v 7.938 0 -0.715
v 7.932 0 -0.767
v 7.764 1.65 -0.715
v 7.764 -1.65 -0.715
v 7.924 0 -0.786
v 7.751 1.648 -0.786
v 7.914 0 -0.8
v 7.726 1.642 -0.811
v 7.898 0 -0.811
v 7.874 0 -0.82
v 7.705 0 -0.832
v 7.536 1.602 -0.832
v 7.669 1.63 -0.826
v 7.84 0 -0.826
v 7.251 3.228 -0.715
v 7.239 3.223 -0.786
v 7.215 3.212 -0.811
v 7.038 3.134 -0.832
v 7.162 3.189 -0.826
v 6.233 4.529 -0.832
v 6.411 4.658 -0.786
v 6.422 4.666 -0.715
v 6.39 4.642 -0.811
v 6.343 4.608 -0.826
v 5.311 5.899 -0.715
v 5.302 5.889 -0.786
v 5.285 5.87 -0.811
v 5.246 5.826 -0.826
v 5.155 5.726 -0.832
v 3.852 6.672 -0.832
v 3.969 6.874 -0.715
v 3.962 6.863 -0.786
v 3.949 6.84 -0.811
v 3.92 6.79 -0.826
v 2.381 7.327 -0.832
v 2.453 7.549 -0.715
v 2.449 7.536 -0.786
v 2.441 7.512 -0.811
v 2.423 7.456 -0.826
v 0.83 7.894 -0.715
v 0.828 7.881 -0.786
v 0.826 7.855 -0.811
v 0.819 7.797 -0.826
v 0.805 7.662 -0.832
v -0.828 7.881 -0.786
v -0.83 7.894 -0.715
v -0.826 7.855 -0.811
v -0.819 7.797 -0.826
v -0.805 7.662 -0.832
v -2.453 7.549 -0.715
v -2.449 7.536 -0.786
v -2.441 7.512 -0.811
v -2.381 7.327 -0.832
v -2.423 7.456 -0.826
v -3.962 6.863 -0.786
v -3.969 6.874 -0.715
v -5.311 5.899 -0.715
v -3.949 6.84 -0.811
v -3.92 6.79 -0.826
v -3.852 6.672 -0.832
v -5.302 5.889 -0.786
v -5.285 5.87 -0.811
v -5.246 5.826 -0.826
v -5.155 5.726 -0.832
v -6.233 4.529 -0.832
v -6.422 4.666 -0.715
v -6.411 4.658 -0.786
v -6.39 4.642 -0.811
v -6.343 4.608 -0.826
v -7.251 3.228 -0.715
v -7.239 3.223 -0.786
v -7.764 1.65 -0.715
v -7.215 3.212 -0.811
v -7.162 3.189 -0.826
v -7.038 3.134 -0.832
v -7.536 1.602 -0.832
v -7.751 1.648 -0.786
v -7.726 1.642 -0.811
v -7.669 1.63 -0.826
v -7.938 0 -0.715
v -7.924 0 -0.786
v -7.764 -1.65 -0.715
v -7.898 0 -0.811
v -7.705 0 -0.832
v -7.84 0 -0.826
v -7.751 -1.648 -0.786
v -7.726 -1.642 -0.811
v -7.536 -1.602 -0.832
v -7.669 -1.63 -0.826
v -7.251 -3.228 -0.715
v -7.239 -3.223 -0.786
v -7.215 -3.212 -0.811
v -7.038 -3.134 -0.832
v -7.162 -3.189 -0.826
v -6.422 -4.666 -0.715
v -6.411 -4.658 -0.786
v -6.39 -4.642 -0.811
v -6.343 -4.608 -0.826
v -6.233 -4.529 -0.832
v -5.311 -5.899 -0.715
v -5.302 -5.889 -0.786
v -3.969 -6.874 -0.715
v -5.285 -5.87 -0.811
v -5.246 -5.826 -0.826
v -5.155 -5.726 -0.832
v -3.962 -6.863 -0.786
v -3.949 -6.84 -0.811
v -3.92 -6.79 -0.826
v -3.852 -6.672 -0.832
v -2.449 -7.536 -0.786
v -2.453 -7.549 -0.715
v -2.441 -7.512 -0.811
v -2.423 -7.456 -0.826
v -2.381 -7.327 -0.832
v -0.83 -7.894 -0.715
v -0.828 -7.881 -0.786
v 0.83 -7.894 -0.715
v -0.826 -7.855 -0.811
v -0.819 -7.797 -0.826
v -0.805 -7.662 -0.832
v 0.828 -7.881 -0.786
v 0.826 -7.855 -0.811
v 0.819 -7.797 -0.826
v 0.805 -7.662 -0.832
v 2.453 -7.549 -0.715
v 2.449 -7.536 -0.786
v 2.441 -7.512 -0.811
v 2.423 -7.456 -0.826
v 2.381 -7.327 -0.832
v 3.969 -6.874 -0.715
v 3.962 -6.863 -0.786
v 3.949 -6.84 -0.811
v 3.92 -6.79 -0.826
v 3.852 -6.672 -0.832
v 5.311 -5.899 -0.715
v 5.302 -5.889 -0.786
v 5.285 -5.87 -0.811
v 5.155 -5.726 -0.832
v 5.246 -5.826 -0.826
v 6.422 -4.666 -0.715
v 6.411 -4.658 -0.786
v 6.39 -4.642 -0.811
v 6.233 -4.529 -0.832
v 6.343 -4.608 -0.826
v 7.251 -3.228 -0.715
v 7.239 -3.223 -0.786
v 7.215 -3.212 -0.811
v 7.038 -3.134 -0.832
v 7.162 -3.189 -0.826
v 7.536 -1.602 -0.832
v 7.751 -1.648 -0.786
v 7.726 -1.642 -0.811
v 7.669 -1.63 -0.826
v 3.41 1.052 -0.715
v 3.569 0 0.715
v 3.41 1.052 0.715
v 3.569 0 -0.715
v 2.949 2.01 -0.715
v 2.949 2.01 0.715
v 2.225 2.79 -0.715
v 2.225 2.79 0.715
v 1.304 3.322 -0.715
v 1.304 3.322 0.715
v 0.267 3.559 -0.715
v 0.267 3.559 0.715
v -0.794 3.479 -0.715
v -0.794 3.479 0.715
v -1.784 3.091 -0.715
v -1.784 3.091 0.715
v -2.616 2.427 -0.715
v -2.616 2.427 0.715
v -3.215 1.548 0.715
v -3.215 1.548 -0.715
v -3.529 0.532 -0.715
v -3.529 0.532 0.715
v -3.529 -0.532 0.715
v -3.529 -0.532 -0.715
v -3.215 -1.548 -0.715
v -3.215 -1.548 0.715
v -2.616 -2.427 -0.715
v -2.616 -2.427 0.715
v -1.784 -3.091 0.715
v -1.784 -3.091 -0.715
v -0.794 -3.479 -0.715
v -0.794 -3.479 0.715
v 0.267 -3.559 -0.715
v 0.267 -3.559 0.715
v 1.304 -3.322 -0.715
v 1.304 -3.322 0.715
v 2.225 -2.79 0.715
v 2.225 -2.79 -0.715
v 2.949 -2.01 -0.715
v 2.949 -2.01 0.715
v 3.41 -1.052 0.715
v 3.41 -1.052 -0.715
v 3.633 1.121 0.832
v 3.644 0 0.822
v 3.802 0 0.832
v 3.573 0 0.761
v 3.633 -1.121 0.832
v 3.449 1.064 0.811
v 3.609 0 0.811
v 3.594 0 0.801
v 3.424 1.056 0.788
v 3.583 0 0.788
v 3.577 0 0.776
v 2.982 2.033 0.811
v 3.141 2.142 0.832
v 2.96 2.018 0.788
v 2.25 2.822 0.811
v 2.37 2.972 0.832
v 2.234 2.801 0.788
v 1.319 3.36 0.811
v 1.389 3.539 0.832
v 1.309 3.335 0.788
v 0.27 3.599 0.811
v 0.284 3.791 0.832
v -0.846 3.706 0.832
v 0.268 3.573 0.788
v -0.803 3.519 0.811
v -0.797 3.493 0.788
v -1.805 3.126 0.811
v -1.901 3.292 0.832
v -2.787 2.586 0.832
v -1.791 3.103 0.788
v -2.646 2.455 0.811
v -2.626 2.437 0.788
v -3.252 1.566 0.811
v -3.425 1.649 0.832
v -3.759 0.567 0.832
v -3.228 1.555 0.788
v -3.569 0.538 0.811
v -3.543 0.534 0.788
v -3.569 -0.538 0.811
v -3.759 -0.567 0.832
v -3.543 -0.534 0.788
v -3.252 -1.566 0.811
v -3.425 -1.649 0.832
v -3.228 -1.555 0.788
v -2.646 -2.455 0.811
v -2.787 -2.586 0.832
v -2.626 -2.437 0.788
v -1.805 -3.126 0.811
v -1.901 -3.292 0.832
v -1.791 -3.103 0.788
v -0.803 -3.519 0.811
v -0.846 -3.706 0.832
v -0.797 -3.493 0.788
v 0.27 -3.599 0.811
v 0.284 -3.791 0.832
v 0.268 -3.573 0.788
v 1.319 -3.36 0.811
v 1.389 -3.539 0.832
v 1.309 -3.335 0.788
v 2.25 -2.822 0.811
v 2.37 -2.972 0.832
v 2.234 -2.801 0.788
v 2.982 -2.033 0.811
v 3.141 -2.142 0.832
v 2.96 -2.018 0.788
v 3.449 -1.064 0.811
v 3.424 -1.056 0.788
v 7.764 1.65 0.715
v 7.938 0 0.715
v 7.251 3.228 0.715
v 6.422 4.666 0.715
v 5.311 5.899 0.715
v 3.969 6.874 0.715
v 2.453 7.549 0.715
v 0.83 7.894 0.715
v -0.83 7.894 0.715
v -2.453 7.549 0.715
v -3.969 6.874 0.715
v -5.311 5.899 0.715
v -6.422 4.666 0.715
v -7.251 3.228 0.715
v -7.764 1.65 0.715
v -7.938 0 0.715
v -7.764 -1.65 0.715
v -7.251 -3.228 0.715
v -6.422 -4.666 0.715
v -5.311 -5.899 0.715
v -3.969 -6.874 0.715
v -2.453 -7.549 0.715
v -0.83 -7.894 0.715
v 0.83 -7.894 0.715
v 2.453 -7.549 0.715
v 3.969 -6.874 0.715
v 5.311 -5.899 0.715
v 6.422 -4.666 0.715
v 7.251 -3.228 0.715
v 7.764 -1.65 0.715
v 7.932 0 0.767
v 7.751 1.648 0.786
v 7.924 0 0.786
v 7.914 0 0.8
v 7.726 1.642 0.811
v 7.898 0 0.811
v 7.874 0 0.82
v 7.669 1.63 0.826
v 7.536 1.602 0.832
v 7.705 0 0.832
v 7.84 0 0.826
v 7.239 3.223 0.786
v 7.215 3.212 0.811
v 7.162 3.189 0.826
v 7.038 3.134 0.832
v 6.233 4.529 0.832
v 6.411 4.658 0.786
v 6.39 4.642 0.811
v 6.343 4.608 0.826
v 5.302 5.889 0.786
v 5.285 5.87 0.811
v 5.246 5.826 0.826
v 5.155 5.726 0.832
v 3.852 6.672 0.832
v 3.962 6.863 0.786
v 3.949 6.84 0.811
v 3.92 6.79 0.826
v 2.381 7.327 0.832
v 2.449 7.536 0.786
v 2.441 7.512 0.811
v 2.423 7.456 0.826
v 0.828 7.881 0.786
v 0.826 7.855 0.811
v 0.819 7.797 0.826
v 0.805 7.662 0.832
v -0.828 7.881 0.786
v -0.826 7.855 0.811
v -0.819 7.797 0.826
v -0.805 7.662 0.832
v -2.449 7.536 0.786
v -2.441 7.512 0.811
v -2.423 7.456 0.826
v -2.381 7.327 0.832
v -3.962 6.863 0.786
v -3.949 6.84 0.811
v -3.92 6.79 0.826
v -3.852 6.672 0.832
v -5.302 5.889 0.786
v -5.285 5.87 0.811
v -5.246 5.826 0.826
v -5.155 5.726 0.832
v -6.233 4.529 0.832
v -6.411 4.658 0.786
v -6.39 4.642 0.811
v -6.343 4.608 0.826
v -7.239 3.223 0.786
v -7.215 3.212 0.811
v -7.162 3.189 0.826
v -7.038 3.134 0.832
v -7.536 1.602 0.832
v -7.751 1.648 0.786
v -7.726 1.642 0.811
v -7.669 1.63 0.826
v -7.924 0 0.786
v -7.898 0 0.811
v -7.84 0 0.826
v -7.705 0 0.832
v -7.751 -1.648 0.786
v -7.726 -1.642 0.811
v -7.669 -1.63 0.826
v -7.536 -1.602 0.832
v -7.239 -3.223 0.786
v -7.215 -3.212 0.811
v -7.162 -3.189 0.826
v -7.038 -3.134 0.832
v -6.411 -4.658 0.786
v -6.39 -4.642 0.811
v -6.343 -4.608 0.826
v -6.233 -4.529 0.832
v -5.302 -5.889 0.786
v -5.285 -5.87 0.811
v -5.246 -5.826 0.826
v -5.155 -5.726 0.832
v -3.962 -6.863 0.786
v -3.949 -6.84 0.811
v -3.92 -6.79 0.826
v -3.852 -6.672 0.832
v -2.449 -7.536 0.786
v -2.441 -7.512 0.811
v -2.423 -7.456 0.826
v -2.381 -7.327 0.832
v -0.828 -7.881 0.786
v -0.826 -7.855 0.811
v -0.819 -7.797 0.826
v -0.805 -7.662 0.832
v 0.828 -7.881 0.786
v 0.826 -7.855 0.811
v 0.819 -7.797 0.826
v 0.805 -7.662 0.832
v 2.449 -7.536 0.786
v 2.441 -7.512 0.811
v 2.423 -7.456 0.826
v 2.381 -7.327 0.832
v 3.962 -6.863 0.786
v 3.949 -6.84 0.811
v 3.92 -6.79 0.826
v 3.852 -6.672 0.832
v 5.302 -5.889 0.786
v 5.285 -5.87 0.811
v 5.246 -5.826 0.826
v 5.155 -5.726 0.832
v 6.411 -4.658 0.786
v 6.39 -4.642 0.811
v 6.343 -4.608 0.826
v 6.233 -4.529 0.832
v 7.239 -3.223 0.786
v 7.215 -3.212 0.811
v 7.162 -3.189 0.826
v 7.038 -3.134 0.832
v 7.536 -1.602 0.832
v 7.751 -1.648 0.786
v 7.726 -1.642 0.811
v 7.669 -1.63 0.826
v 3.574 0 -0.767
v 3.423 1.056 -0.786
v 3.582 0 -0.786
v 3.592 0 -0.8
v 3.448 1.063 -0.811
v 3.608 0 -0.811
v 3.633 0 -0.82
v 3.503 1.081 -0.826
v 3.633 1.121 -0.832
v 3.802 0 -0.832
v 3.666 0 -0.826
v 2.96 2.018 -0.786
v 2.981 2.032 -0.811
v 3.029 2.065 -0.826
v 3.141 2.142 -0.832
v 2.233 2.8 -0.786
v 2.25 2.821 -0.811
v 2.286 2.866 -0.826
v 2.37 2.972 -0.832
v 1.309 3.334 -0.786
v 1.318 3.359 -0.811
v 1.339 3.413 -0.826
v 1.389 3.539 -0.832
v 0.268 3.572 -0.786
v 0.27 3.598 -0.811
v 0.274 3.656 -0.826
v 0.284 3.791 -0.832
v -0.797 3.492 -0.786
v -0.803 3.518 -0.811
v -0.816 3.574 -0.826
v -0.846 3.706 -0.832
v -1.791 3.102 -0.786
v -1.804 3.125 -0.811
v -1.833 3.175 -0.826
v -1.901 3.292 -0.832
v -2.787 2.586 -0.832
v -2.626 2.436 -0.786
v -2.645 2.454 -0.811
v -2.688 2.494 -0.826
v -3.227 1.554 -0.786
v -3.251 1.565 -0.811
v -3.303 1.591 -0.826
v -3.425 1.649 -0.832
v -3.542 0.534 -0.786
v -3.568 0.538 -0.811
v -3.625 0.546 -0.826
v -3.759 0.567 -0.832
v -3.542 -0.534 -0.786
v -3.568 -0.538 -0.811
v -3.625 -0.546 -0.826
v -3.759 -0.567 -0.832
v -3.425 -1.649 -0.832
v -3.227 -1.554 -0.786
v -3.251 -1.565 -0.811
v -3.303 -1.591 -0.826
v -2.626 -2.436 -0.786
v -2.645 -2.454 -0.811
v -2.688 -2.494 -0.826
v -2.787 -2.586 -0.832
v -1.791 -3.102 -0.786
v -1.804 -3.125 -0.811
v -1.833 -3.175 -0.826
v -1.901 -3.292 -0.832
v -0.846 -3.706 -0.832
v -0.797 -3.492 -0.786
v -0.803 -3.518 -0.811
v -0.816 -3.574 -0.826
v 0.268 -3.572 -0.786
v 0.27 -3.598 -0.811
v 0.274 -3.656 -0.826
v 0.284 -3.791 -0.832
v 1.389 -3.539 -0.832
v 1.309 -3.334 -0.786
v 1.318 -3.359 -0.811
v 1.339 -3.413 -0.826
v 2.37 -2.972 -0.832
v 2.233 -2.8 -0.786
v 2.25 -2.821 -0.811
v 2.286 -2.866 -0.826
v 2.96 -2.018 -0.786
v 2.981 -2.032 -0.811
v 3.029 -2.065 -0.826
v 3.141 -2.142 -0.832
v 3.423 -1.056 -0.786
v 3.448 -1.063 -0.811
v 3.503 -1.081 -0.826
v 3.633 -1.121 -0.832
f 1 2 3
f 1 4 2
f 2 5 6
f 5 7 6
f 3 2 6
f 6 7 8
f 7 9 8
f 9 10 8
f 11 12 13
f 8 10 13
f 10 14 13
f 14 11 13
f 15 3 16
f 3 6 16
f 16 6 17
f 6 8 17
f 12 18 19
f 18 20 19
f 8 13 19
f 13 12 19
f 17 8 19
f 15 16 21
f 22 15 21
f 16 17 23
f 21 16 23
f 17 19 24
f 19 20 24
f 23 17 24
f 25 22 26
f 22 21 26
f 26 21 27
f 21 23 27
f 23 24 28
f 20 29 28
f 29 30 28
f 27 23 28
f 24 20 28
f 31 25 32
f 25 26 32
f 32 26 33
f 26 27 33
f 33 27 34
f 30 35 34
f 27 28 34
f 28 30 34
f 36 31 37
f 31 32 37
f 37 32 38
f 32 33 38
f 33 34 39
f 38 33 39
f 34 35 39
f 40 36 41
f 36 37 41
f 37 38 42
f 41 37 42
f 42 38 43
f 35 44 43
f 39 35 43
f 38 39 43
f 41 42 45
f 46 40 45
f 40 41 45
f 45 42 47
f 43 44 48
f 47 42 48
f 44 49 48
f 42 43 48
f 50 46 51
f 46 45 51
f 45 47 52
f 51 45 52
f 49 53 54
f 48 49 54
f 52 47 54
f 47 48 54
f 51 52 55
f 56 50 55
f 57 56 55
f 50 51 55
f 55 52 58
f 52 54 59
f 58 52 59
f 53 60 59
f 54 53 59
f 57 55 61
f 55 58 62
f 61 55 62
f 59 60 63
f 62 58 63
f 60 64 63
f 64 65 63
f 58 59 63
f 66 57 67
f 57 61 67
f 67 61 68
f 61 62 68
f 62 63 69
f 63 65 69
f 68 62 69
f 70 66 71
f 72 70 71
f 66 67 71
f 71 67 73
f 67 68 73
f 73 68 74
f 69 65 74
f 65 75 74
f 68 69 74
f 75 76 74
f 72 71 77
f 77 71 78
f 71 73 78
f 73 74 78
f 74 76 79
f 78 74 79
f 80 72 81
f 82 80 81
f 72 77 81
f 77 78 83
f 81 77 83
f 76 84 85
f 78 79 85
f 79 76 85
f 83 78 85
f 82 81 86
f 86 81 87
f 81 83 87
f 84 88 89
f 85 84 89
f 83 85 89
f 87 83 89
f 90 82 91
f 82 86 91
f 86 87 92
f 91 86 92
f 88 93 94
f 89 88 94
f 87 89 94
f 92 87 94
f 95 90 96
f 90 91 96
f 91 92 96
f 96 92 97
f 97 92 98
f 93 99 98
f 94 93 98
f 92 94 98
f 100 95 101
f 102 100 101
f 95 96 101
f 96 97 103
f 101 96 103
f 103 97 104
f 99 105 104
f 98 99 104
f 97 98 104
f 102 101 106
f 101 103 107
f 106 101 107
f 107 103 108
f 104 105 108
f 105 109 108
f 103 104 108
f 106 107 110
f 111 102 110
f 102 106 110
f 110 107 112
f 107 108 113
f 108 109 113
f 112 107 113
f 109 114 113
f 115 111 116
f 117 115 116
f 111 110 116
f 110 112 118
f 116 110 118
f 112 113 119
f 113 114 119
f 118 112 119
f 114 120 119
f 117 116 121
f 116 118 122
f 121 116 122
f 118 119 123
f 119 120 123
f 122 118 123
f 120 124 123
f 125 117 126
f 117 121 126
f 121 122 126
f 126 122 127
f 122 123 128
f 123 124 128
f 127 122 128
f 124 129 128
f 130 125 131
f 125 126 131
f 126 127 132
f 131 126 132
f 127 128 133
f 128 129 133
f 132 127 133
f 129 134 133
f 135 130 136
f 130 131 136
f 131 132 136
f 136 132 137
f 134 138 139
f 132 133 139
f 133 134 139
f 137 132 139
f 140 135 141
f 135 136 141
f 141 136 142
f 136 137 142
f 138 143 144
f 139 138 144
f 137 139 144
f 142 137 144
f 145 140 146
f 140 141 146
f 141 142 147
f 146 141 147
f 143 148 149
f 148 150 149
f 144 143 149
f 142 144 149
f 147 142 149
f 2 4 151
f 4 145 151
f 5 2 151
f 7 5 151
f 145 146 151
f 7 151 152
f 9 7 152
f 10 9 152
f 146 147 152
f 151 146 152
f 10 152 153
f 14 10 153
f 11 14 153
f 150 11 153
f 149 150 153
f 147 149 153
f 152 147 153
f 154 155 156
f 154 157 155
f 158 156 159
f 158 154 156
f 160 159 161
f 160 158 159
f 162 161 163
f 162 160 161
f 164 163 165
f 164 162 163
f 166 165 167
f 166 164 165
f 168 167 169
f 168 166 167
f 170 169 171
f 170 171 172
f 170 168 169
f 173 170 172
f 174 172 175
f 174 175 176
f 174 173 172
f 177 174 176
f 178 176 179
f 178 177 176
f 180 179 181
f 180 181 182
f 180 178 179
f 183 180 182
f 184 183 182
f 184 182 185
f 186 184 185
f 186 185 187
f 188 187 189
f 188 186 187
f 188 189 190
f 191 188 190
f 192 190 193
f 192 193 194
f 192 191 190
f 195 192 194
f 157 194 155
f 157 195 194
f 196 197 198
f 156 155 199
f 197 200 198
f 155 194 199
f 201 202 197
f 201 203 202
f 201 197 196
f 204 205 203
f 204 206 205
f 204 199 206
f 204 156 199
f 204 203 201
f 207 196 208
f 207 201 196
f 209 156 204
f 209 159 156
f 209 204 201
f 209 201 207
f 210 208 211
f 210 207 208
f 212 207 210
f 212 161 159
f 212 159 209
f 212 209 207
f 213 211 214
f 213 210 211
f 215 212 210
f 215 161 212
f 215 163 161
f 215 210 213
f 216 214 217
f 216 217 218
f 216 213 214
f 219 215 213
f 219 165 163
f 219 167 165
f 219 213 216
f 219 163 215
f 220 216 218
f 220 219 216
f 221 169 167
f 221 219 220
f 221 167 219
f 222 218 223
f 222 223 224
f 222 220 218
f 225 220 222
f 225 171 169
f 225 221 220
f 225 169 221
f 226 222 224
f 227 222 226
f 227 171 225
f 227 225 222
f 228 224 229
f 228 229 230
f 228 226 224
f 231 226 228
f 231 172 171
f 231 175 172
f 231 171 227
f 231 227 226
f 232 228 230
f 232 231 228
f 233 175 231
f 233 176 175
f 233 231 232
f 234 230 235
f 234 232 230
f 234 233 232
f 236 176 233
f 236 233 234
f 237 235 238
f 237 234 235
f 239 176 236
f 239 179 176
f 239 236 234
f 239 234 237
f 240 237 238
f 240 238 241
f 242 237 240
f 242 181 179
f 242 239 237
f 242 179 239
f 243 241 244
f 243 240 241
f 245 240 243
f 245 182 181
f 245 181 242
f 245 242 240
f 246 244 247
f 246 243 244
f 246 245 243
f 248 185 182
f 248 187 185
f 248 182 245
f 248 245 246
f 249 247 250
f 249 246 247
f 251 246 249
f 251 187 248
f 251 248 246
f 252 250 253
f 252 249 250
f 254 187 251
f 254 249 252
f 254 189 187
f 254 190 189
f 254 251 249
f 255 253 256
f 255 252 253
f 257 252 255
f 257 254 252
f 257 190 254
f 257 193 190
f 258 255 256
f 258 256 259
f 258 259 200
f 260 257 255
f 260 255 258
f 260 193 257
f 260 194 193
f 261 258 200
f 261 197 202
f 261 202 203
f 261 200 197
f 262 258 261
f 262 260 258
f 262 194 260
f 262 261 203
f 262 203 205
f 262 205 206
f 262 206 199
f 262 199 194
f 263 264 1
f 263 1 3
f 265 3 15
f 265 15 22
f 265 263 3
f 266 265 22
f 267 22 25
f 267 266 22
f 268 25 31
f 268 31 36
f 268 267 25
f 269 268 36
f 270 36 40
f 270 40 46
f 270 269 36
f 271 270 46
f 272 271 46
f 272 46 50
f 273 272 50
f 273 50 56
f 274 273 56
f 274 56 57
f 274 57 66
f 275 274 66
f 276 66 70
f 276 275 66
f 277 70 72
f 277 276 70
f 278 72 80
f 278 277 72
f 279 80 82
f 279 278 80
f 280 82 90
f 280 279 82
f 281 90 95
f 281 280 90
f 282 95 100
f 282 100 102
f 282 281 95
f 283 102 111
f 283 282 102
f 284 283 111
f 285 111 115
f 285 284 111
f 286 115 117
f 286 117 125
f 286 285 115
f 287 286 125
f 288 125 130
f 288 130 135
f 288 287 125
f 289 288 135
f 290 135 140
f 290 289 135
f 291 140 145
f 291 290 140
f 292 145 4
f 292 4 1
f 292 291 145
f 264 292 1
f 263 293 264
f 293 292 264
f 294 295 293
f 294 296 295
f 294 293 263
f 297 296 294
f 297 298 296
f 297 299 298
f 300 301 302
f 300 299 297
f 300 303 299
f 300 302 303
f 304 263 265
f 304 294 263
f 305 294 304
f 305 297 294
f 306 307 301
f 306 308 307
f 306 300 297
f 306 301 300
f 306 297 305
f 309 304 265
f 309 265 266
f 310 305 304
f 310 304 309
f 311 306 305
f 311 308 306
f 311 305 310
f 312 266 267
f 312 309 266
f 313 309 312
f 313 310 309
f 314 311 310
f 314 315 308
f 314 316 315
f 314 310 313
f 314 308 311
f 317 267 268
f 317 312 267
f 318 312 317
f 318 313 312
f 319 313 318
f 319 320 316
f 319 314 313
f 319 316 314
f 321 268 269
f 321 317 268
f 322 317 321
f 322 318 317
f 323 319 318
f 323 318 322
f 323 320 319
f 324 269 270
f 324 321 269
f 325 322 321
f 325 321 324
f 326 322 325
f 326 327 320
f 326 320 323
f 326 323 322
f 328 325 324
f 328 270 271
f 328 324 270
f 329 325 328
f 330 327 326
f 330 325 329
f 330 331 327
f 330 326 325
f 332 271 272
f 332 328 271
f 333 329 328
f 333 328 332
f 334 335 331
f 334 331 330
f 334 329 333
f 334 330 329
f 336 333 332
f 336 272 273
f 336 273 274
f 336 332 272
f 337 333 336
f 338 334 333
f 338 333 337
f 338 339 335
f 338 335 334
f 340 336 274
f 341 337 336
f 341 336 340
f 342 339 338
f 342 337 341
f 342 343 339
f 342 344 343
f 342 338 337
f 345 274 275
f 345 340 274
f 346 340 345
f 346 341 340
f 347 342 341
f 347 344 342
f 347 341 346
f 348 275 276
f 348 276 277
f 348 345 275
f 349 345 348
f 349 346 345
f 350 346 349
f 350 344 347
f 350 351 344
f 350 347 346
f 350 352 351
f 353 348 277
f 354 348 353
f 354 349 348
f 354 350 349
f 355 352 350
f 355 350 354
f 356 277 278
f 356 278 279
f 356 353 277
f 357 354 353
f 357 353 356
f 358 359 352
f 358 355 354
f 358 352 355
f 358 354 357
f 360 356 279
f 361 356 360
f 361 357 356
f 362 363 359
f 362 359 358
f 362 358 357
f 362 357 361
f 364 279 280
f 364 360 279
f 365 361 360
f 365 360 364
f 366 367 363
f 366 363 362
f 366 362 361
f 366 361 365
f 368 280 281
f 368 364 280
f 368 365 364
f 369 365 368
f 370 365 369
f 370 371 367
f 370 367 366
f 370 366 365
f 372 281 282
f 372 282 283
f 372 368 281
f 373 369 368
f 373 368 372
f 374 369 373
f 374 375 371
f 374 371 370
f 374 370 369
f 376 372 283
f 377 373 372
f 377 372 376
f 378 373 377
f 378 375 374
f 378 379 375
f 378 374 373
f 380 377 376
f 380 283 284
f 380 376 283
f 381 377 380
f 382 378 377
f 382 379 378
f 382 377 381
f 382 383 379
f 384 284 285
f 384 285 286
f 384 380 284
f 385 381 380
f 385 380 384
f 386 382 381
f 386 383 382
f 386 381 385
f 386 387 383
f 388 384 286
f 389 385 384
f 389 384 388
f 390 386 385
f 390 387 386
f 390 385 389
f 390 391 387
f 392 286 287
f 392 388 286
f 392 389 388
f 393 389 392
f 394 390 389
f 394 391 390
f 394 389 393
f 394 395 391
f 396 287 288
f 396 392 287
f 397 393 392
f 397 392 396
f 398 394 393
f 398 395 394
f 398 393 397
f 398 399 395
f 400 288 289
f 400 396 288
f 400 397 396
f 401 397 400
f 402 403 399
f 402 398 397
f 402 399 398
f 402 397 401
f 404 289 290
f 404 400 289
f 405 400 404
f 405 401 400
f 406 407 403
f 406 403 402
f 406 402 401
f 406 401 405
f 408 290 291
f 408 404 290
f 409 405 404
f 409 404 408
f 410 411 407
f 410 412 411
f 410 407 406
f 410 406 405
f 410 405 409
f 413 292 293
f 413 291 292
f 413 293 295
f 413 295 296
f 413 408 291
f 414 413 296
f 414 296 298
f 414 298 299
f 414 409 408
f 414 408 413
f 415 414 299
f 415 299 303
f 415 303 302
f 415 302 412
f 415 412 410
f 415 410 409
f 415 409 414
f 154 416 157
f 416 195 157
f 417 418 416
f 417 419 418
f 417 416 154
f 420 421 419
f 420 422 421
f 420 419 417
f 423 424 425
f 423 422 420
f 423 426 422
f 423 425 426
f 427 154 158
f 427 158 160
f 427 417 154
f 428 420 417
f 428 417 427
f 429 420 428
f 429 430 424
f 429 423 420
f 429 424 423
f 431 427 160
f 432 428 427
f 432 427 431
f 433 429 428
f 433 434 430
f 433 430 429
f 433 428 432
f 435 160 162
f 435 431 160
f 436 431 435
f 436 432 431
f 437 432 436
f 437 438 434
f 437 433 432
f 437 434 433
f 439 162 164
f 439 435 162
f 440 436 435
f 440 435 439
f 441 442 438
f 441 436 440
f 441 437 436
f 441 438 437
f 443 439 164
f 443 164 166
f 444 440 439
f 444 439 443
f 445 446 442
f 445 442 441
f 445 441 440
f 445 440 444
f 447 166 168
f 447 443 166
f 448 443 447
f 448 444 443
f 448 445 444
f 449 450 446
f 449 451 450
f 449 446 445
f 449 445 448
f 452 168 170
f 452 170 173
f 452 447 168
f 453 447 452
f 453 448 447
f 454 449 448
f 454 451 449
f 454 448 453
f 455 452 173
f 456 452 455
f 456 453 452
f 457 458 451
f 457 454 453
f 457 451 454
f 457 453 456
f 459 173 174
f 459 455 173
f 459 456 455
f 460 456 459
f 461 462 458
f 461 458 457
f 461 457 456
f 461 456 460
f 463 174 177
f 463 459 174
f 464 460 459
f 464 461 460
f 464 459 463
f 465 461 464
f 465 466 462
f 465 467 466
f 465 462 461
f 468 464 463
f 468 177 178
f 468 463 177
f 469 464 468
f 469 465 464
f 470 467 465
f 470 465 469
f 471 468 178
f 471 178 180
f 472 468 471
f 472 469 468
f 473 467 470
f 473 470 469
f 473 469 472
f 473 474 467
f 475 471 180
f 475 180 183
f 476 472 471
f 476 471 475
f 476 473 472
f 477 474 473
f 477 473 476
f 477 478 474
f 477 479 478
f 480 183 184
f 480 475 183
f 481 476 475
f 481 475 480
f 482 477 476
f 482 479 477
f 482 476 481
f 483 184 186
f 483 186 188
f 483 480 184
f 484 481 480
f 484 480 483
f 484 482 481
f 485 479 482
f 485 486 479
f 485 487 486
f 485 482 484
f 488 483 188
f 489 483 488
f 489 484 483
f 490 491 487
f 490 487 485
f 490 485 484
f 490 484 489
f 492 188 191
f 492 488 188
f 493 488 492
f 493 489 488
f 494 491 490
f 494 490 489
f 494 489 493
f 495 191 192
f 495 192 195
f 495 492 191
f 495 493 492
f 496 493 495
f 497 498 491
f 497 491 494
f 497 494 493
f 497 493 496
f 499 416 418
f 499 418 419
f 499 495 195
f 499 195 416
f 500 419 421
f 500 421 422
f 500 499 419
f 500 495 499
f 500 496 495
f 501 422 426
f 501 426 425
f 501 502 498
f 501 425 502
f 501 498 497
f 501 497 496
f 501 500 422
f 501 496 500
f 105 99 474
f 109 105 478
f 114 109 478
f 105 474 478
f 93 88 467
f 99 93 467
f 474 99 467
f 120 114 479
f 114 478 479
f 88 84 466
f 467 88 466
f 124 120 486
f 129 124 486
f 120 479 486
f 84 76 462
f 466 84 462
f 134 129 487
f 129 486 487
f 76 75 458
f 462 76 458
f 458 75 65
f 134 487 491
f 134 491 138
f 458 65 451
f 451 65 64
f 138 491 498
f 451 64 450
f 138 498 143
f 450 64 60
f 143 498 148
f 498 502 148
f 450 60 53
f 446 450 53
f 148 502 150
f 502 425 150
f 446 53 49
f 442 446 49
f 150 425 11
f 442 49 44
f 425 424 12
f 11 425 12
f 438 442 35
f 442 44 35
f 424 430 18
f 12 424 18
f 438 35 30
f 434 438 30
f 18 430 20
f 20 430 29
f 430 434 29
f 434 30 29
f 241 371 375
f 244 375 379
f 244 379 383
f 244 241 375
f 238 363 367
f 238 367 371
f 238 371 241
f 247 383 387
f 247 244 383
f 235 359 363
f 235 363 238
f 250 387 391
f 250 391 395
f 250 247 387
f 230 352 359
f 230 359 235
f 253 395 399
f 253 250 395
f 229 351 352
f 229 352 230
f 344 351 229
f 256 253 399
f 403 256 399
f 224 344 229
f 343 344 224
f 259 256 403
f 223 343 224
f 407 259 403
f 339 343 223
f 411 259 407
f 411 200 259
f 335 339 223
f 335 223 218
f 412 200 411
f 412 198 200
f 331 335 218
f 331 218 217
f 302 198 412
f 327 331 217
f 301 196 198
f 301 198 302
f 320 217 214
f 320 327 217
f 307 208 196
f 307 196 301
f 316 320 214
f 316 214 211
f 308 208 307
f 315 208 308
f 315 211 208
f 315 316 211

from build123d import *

# Parameters (mm, degrees)
SKETCH3_R           = 7.9375
SKETCH3_R_2         = 3.5687
BOSS_EXTRUDE1_DEPTH = 0.83185
FILLET1_SIZE        = 0.116459
FILLET1_SIZE_2      = 0.232918


with BuildPart() as part:
    # Sketch3 → Boss-Extrude1 (new, symmetric)
    with BuildSketch(Plane.XY):
        Circle(SKETCH3_R)
        Circle(SKETCH3_R_2, mode=Mode.SUBTRACT)
    extrude(amount=BOSS_EXTRUDE1_DEPTH, both=True)

    # Fillet1
    # a fillet whose section is not a circle: 0.232918, 0.116459 mm, written as the material it takes off along each edge
    with BuildSketch(Plane(origin=(0, 0, -0.83185), x_dir=(1, 0, 0), z_dir=(0, -1, 0))) as fillet1_piece_1:
        with BuildLine():
            Bezier((7.9375, FILLET1_SIZE), (7.9375, 0), (7.9375 - FILLET1_SIZE_2, 0), weights=[1, 1.857142857, 1])
            Line((7.9375 - FILLET1_SIZE_2, 0), (7.9375, 0))
            Line((7.9375, 0), (7.9375, FILLET1_SIZE))
        make_face()
    revolve(axis=Axis((0, 0, -0.83185), (0, 0, 1)), mode=Mode.SUBTRACT)
    with BuildSketch(Plane(origin=(0, 0, 0.83185), x_dir=(1, 0, 0), z_dir=(0, -1, 0))) as fillet1_piece_2:
        with BuildLine():
            Bezier((7.9375, -FILLET1_SIZE), (7.9375, 0), (7.9375 - FILLET1_SIZE_2, 0), weights=[1, 1.857142857, 1])
            Line((7.9375 - FILLET1_SIZE_2, 0), (7.9375, 0))
            Line((7.9375, 0), (7.9375, -FILLET1_SIZE))
        make_face()
    revolve(axis=Axis((0, 0, 0.83185), (0, 0, 1)), mode=Mode.SUBTRACT)
    with BuildSketch(Plane(origin=(0, 0, -0.83185), x_dir=(1, 0, 0), z_dir=(0, -1, 0))) as fillet1_piece_3:
        with BuildLine():
            Bezier((3.5687, FILLET1_SIZE), (3.5687, 0), (3.5687 + FILLET1_SIZE_2, 0), weights=[1, 1.857142857, 1])
            Line((3.5687 + FILLET1_SIZE_2, 0), (3.5687, 0))
            Line((3.5687, 0), (3.5687, FILLET1_SIZE))
        make_face()
    revolve(axis=Axis((0, 0, -0.83185), (0, 0, 1)), mode=Mode.SUBTRACT)
    with BuildSketch(Plane(origin=(0, 0, 0.83185), x_dir=(1, 0, 0), z_dir=(0, -1, 0))) as fillet1_piece_4:
        with BuildLine():
            Bezier((3.5687 + FILLET1_SIZE_2, 0), (3.5687, 0), (3.5687, -FILLET1_SIZE), weights=[1, 1.857142857, 1])
            Line((3.5687, -FILLET1_SIZE), (3.5687, 0))
            Line((3.5687, 0), (3.5687 + FILLET1_SIZE_2, 0))
        make_face()
    revolve(axis=Axis((0, 0, 0.83185), (0, 0, 1)), mode=Mode.SUBTRACT)


solid = part.part
